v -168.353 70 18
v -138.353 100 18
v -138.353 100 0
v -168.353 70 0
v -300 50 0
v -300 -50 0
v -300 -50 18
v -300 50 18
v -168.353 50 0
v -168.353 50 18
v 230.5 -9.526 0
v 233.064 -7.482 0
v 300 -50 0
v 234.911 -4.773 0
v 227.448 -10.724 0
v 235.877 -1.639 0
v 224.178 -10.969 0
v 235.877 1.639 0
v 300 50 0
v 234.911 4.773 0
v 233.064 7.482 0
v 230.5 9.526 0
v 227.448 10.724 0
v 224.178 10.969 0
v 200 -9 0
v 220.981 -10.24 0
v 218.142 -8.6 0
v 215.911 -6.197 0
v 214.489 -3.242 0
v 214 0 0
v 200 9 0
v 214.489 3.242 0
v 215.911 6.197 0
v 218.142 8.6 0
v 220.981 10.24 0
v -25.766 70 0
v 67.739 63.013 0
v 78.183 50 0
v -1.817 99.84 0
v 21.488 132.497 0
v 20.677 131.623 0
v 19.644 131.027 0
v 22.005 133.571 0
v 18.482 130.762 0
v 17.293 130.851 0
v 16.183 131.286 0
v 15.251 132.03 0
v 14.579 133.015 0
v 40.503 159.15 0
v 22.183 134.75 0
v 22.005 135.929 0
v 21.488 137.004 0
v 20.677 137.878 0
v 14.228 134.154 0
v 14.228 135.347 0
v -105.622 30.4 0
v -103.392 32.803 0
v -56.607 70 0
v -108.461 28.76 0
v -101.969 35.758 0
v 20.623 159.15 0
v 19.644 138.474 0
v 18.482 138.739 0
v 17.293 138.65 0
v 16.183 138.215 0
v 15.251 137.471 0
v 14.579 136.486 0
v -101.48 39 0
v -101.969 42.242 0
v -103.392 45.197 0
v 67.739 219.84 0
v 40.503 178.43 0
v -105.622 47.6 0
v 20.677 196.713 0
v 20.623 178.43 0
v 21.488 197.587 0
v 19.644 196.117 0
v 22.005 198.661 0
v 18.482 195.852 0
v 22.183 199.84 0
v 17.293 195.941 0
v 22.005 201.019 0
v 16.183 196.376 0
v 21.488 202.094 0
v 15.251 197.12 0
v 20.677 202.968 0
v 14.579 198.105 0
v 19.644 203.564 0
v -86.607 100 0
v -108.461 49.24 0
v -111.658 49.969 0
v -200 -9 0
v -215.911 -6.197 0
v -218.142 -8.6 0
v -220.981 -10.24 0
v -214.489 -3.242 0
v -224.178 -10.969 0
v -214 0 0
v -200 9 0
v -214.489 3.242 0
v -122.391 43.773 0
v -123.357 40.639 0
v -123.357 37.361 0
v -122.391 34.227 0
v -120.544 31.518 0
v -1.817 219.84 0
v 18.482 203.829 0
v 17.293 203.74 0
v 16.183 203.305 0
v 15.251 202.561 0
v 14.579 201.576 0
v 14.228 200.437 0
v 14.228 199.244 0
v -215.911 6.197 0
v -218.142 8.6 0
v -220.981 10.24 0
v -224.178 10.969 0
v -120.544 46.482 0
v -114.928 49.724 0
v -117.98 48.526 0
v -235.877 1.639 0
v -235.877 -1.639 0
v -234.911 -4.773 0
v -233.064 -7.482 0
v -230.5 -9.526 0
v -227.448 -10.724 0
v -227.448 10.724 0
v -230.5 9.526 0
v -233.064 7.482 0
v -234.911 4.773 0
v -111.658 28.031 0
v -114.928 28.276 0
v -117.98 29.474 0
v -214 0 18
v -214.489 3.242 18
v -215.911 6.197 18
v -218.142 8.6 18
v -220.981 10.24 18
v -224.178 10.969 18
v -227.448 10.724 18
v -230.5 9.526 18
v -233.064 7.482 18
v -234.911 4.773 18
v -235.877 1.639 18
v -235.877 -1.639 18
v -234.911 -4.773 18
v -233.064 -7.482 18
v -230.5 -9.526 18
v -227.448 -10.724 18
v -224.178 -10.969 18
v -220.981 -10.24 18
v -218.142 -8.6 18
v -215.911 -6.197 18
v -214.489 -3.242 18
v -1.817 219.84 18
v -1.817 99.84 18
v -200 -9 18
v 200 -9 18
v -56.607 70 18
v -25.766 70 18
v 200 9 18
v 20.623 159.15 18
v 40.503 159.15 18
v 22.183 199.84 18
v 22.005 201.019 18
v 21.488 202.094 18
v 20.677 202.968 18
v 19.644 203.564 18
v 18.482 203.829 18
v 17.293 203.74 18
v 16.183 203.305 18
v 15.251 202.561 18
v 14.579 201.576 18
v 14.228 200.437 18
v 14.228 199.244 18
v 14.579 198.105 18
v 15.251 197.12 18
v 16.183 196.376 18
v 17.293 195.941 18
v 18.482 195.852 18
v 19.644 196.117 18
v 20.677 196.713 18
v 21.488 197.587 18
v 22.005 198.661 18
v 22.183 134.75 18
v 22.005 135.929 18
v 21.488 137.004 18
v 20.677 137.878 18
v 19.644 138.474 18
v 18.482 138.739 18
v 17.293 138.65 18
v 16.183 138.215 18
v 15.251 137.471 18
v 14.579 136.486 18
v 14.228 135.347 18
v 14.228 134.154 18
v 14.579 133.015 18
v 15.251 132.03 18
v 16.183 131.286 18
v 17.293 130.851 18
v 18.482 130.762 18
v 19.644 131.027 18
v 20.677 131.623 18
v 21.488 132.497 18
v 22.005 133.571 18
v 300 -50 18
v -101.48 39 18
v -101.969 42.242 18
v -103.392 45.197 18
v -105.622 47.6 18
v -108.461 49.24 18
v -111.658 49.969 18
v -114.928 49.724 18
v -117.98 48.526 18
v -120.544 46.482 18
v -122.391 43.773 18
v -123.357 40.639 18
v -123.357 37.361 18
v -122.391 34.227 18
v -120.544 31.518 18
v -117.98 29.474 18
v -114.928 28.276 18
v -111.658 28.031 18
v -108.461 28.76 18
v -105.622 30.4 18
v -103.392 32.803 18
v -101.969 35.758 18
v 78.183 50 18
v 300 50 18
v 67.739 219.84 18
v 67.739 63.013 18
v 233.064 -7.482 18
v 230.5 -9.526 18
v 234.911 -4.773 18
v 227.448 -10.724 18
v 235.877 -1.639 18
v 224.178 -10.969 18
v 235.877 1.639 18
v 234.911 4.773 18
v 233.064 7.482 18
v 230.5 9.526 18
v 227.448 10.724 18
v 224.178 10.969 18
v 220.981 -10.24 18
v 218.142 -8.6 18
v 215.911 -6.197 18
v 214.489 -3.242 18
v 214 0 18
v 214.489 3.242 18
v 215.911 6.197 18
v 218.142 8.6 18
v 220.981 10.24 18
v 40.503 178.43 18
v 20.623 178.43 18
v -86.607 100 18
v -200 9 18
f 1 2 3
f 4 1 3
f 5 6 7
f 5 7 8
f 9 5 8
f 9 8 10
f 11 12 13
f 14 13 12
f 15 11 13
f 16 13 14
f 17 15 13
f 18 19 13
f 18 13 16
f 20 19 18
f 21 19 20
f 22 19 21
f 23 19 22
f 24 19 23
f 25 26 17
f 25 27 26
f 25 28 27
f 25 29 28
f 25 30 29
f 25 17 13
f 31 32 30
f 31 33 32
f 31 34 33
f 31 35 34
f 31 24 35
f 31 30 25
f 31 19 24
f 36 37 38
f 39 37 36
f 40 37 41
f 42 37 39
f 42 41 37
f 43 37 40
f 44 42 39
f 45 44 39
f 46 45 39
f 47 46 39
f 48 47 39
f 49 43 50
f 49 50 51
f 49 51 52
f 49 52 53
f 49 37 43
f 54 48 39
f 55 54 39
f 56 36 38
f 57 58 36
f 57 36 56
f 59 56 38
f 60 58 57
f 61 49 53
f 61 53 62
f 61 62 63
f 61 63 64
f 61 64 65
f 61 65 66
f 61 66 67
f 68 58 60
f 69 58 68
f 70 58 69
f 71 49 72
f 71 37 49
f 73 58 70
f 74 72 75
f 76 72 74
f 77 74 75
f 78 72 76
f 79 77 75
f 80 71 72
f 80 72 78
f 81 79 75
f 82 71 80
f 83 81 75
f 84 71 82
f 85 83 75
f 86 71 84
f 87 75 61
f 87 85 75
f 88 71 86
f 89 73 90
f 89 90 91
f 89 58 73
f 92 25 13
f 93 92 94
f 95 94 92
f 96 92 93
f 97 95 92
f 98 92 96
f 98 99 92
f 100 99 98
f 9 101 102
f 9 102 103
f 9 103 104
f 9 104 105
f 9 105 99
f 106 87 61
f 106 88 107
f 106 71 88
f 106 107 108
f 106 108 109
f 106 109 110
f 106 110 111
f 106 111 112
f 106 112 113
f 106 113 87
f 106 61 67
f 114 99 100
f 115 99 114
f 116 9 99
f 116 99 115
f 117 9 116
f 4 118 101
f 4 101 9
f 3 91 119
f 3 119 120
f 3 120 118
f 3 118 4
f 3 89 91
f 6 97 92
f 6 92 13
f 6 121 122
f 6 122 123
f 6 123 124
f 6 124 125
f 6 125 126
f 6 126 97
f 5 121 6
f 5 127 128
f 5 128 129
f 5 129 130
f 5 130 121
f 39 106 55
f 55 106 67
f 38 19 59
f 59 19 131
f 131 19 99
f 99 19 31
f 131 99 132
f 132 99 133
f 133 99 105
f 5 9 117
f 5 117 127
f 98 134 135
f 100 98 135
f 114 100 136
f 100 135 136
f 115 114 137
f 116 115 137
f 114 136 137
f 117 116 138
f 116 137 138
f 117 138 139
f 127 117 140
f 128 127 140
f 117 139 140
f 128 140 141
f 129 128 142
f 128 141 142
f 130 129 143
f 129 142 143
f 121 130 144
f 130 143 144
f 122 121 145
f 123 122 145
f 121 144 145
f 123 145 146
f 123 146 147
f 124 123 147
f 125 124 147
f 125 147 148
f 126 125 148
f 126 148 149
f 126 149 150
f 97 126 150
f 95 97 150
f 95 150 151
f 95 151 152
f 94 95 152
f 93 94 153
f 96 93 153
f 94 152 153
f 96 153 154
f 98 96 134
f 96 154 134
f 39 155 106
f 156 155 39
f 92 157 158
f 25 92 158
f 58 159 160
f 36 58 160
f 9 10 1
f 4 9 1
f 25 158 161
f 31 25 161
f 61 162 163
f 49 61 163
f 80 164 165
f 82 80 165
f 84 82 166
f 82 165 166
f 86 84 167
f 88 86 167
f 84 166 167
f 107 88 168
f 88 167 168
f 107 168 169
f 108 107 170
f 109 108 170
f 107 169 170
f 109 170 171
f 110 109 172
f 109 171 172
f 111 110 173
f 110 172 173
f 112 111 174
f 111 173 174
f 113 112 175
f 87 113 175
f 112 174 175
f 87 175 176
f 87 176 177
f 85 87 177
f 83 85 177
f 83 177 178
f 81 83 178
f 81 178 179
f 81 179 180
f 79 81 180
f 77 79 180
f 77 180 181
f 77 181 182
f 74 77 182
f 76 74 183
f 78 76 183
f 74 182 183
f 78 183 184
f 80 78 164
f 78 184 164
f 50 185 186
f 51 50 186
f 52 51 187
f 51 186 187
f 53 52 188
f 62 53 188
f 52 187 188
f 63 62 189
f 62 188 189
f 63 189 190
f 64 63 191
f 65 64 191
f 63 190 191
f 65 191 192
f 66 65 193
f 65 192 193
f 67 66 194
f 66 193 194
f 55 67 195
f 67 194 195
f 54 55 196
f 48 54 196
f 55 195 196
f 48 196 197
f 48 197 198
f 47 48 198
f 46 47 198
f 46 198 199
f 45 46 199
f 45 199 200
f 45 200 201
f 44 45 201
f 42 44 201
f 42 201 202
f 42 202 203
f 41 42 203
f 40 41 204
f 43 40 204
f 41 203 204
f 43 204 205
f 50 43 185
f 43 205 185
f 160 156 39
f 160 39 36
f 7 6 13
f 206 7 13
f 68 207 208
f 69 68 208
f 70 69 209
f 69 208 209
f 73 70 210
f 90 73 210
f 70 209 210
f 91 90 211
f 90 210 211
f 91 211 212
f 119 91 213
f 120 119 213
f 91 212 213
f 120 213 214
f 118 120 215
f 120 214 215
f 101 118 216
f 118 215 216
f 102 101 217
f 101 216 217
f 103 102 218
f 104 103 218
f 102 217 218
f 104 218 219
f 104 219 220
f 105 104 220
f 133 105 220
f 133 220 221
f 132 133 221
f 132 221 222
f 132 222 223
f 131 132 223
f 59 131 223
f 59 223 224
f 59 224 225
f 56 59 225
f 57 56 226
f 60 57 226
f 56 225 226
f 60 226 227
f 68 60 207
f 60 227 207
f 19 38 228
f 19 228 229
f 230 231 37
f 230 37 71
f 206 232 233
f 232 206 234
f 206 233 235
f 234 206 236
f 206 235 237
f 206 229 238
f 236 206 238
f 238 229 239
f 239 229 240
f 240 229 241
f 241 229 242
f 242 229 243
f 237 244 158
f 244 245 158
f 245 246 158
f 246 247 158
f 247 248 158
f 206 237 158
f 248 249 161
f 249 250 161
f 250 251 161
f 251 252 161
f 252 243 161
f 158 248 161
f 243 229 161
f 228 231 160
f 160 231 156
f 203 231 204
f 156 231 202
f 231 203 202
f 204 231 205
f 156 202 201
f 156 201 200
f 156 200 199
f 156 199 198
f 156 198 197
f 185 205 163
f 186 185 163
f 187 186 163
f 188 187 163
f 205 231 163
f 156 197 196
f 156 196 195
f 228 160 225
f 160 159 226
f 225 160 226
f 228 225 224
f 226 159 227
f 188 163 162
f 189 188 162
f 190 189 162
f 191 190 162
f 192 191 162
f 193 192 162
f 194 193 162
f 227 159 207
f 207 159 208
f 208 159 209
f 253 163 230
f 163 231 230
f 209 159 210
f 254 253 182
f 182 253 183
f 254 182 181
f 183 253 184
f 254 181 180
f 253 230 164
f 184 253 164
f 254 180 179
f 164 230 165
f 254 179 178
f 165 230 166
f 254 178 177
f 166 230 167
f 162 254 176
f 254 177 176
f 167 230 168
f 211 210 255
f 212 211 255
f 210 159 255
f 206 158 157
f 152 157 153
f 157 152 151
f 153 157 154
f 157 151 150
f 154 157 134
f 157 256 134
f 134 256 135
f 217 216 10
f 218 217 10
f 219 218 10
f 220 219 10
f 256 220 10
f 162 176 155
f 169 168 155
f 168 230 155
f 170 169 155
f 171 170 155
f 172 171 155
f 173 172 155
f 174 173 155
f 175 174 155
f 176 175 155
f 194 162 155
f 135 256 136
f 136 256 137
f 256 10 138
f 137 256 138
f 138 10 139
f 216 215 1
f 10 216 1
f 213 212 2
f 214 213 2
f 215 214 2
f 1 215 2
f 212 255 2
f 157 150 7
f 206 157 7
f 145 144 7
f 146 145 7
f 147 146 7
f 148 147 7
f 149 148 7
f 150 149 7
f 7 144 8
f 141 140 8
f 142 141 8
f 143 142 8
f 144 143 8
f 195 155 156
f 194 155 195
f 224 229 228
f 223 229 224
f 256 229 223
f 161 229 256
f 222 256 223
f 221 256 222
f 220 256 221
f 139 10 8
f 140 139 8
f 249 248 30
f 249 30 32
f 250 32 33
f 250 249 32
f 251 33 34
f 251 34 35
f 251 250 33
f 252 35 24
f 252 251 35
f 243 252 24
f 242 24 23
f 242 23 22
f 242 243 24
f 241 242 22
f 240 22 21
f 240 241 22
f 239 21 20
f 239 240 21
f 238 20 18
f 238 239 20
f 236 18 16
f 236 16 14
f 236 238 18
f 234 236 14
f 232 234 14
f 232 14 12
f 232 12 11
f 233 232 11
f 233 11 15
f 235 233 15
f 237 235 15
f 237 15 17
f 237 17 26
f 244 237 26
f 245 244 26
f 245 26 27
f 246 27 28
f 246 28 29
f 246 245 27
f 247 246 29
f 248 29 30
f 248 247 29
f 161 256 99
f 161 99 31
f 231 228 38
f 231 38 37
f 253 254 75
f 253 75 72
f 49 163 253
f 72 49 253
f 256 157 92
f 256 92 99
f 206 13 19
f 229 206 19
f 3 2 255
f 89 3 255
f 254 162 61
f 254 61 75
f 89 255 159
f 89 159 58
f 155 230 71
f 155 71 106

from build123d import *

# Parameters (mm, degrees)
SCHIZZO1_W                   = 600
SCHIZZO1_H                   = 100
ESTRUSIONE_ESTRUSIONE1_DEPTH = 18
SCHIZZO2_W                   = 400
SCHIZZO2_H                   = 18
TAGLIO_ESTRUSIONE1_DEPTH     = 18
SCHIZZO3_R                   = 11
TAGLIO_ESTRUSIONE2_DEPTH     = 18
SCHIZZO7_W                   = 111.74591768
SCHIZZO7_H                   = 50
ESTRUSIONE_ESTRUSIONE2_DEPTH = 18
SCHIZZO4_R                   = 11
TAGLIO_ESTRUSIONE4_DEPTH     = 18
SMUSSO1_SIZE                 = 30
SCHIZZO9_R                   = 4
ESTRUSIONE_ESTRUSIONE3_DEPTH = 18
ESTRUSIONE_ESTRUSIONE4_DEPTH = 18
SCHIZZO15_W                  = 19.88
SCHIZZO15_H                  = 19.28
TAGLIO_ESTRUSIONE7_DEPTH     = 20


with BuildPart() as part:
    # Schizzo1 → Estrusione-Estrusione1 (new body)
    with BuildSketch(Plane.XY):
        Rectangle(SCHIZZO1_W, SCHIZZO1_H)
    extrude(amount=ESTRUSIONE_ESTRUSIONE1_DEPTH)

    # Schizzo2 → Taglio-Estrusione1 (cut)
    with BuildSketch(Plane.XY.offset(18)):
        Rectangle(SCHIZZO2_W, SCHIZZO2_H)
    extrude(amount=-TAGLIO_ESTRUSIONE1_DEPTH, mode=Mode.SUBTRACT)

    # Schizzo3 → Taglio-Estrusione2 (cut)
    with BuildSketch(Plane.XY.offset(18)):
        with Locations((-225, 0)):
            Circle(SCHIZZO3_R)
    taglio_estrusione2 = extrude(amount=-TAGLIO_ESTRUSIONE2_DEPTH, mode=Mode.SUBTRACT)

    # Specchia1: Taglio-Estrusione2 across plane
    add(taglio_estrusione2.mirror(Plane(origin=(0, 0, 0), x_dir=(0, 0, 1), z_dir=(1, 0, 0))), mode=Mode.SUBTRACT)

    # Schizzo7 → Estrusione-Estrusione2 (add)
    with BuildSketch(Plane.XY.offset(18)):
        with Locations((-112.480128411, 75)):
            Rectangle(SCHIZZO7_W, SCHIZZO7_H)
    extrude(amount=-ESTRUSIONE_ESTRUSIONE2_DEPTH)

    # Schizzo4 → Taglio-Estrusione4 (cut)
    with BuildSketch(Plane.XY.offset(18)):
        with Locations((-112.480128411, 39)):
            Circle(SCHIZZO4_R)
    extrude(amount=-TAGLIO_ESTRUSIONE4_DEPTH, mode=Mode.SUBTRACT)

    # Smusso1
    smusso1_edges = [part.edges().sort_by_distance(p)[0] for p in [
        (-168.353087251, 100, 9),
        (-56.607169571, 100, 9),
    ]]
    chamfer(smusso1_edges, length=SMUSSO1_SIZE)

    # Schizzo9 → Estrusione-Estrusione3 (add)
    with BuildSketch(Plane.XY.offset(18)):
        Polygon((-1.816869292, 219.840422), (-1.816869292, 99.840422), (-41.816869292, 50), (78.183130708, 50), (67.739440982, 63.012947579), (67.739440982, 219.840422), align=None)
        with Locations((18.183130708, 199.840422)):
            Circle(SCHIZZO9_R, mode=Mode.SUBTRACT)
        with Locations((18.183130708, 134.750422)):
            Circle(SCHIZZO9_R, mode=Mode.SUBTRACT)
    extrude(amount=-ESTRUSIONE_ESTRUSIONE3_DEPTH)

    # Schizzo10 → Estrusione-Estrusione4 (add)
    with BuildSketch(Plane.XY.offset(18)):
        Polygon((-56.607169571, 70), (-25.765640833, 70), (-41.816869292, 50), (-56.607169571, 50), align=None)
    extrude(amount=-ESTRUSIONE_ESTRUSIONE4_DEPTH)

    # Schizzo15 → Taglio-Estrusione7 (cut)
    with BuildSketch(Plane.XY.offset(18)):
        with Locations((30.563130708, 168.790422)):
            Rectangle(SCHIZZO15_W, SCHIZZO15_H)
    extrude(amount=-TAGLIO_ESTRUSIONE7_DEPTH, mode=Mode.SUBTRACT)


solid = part.part
